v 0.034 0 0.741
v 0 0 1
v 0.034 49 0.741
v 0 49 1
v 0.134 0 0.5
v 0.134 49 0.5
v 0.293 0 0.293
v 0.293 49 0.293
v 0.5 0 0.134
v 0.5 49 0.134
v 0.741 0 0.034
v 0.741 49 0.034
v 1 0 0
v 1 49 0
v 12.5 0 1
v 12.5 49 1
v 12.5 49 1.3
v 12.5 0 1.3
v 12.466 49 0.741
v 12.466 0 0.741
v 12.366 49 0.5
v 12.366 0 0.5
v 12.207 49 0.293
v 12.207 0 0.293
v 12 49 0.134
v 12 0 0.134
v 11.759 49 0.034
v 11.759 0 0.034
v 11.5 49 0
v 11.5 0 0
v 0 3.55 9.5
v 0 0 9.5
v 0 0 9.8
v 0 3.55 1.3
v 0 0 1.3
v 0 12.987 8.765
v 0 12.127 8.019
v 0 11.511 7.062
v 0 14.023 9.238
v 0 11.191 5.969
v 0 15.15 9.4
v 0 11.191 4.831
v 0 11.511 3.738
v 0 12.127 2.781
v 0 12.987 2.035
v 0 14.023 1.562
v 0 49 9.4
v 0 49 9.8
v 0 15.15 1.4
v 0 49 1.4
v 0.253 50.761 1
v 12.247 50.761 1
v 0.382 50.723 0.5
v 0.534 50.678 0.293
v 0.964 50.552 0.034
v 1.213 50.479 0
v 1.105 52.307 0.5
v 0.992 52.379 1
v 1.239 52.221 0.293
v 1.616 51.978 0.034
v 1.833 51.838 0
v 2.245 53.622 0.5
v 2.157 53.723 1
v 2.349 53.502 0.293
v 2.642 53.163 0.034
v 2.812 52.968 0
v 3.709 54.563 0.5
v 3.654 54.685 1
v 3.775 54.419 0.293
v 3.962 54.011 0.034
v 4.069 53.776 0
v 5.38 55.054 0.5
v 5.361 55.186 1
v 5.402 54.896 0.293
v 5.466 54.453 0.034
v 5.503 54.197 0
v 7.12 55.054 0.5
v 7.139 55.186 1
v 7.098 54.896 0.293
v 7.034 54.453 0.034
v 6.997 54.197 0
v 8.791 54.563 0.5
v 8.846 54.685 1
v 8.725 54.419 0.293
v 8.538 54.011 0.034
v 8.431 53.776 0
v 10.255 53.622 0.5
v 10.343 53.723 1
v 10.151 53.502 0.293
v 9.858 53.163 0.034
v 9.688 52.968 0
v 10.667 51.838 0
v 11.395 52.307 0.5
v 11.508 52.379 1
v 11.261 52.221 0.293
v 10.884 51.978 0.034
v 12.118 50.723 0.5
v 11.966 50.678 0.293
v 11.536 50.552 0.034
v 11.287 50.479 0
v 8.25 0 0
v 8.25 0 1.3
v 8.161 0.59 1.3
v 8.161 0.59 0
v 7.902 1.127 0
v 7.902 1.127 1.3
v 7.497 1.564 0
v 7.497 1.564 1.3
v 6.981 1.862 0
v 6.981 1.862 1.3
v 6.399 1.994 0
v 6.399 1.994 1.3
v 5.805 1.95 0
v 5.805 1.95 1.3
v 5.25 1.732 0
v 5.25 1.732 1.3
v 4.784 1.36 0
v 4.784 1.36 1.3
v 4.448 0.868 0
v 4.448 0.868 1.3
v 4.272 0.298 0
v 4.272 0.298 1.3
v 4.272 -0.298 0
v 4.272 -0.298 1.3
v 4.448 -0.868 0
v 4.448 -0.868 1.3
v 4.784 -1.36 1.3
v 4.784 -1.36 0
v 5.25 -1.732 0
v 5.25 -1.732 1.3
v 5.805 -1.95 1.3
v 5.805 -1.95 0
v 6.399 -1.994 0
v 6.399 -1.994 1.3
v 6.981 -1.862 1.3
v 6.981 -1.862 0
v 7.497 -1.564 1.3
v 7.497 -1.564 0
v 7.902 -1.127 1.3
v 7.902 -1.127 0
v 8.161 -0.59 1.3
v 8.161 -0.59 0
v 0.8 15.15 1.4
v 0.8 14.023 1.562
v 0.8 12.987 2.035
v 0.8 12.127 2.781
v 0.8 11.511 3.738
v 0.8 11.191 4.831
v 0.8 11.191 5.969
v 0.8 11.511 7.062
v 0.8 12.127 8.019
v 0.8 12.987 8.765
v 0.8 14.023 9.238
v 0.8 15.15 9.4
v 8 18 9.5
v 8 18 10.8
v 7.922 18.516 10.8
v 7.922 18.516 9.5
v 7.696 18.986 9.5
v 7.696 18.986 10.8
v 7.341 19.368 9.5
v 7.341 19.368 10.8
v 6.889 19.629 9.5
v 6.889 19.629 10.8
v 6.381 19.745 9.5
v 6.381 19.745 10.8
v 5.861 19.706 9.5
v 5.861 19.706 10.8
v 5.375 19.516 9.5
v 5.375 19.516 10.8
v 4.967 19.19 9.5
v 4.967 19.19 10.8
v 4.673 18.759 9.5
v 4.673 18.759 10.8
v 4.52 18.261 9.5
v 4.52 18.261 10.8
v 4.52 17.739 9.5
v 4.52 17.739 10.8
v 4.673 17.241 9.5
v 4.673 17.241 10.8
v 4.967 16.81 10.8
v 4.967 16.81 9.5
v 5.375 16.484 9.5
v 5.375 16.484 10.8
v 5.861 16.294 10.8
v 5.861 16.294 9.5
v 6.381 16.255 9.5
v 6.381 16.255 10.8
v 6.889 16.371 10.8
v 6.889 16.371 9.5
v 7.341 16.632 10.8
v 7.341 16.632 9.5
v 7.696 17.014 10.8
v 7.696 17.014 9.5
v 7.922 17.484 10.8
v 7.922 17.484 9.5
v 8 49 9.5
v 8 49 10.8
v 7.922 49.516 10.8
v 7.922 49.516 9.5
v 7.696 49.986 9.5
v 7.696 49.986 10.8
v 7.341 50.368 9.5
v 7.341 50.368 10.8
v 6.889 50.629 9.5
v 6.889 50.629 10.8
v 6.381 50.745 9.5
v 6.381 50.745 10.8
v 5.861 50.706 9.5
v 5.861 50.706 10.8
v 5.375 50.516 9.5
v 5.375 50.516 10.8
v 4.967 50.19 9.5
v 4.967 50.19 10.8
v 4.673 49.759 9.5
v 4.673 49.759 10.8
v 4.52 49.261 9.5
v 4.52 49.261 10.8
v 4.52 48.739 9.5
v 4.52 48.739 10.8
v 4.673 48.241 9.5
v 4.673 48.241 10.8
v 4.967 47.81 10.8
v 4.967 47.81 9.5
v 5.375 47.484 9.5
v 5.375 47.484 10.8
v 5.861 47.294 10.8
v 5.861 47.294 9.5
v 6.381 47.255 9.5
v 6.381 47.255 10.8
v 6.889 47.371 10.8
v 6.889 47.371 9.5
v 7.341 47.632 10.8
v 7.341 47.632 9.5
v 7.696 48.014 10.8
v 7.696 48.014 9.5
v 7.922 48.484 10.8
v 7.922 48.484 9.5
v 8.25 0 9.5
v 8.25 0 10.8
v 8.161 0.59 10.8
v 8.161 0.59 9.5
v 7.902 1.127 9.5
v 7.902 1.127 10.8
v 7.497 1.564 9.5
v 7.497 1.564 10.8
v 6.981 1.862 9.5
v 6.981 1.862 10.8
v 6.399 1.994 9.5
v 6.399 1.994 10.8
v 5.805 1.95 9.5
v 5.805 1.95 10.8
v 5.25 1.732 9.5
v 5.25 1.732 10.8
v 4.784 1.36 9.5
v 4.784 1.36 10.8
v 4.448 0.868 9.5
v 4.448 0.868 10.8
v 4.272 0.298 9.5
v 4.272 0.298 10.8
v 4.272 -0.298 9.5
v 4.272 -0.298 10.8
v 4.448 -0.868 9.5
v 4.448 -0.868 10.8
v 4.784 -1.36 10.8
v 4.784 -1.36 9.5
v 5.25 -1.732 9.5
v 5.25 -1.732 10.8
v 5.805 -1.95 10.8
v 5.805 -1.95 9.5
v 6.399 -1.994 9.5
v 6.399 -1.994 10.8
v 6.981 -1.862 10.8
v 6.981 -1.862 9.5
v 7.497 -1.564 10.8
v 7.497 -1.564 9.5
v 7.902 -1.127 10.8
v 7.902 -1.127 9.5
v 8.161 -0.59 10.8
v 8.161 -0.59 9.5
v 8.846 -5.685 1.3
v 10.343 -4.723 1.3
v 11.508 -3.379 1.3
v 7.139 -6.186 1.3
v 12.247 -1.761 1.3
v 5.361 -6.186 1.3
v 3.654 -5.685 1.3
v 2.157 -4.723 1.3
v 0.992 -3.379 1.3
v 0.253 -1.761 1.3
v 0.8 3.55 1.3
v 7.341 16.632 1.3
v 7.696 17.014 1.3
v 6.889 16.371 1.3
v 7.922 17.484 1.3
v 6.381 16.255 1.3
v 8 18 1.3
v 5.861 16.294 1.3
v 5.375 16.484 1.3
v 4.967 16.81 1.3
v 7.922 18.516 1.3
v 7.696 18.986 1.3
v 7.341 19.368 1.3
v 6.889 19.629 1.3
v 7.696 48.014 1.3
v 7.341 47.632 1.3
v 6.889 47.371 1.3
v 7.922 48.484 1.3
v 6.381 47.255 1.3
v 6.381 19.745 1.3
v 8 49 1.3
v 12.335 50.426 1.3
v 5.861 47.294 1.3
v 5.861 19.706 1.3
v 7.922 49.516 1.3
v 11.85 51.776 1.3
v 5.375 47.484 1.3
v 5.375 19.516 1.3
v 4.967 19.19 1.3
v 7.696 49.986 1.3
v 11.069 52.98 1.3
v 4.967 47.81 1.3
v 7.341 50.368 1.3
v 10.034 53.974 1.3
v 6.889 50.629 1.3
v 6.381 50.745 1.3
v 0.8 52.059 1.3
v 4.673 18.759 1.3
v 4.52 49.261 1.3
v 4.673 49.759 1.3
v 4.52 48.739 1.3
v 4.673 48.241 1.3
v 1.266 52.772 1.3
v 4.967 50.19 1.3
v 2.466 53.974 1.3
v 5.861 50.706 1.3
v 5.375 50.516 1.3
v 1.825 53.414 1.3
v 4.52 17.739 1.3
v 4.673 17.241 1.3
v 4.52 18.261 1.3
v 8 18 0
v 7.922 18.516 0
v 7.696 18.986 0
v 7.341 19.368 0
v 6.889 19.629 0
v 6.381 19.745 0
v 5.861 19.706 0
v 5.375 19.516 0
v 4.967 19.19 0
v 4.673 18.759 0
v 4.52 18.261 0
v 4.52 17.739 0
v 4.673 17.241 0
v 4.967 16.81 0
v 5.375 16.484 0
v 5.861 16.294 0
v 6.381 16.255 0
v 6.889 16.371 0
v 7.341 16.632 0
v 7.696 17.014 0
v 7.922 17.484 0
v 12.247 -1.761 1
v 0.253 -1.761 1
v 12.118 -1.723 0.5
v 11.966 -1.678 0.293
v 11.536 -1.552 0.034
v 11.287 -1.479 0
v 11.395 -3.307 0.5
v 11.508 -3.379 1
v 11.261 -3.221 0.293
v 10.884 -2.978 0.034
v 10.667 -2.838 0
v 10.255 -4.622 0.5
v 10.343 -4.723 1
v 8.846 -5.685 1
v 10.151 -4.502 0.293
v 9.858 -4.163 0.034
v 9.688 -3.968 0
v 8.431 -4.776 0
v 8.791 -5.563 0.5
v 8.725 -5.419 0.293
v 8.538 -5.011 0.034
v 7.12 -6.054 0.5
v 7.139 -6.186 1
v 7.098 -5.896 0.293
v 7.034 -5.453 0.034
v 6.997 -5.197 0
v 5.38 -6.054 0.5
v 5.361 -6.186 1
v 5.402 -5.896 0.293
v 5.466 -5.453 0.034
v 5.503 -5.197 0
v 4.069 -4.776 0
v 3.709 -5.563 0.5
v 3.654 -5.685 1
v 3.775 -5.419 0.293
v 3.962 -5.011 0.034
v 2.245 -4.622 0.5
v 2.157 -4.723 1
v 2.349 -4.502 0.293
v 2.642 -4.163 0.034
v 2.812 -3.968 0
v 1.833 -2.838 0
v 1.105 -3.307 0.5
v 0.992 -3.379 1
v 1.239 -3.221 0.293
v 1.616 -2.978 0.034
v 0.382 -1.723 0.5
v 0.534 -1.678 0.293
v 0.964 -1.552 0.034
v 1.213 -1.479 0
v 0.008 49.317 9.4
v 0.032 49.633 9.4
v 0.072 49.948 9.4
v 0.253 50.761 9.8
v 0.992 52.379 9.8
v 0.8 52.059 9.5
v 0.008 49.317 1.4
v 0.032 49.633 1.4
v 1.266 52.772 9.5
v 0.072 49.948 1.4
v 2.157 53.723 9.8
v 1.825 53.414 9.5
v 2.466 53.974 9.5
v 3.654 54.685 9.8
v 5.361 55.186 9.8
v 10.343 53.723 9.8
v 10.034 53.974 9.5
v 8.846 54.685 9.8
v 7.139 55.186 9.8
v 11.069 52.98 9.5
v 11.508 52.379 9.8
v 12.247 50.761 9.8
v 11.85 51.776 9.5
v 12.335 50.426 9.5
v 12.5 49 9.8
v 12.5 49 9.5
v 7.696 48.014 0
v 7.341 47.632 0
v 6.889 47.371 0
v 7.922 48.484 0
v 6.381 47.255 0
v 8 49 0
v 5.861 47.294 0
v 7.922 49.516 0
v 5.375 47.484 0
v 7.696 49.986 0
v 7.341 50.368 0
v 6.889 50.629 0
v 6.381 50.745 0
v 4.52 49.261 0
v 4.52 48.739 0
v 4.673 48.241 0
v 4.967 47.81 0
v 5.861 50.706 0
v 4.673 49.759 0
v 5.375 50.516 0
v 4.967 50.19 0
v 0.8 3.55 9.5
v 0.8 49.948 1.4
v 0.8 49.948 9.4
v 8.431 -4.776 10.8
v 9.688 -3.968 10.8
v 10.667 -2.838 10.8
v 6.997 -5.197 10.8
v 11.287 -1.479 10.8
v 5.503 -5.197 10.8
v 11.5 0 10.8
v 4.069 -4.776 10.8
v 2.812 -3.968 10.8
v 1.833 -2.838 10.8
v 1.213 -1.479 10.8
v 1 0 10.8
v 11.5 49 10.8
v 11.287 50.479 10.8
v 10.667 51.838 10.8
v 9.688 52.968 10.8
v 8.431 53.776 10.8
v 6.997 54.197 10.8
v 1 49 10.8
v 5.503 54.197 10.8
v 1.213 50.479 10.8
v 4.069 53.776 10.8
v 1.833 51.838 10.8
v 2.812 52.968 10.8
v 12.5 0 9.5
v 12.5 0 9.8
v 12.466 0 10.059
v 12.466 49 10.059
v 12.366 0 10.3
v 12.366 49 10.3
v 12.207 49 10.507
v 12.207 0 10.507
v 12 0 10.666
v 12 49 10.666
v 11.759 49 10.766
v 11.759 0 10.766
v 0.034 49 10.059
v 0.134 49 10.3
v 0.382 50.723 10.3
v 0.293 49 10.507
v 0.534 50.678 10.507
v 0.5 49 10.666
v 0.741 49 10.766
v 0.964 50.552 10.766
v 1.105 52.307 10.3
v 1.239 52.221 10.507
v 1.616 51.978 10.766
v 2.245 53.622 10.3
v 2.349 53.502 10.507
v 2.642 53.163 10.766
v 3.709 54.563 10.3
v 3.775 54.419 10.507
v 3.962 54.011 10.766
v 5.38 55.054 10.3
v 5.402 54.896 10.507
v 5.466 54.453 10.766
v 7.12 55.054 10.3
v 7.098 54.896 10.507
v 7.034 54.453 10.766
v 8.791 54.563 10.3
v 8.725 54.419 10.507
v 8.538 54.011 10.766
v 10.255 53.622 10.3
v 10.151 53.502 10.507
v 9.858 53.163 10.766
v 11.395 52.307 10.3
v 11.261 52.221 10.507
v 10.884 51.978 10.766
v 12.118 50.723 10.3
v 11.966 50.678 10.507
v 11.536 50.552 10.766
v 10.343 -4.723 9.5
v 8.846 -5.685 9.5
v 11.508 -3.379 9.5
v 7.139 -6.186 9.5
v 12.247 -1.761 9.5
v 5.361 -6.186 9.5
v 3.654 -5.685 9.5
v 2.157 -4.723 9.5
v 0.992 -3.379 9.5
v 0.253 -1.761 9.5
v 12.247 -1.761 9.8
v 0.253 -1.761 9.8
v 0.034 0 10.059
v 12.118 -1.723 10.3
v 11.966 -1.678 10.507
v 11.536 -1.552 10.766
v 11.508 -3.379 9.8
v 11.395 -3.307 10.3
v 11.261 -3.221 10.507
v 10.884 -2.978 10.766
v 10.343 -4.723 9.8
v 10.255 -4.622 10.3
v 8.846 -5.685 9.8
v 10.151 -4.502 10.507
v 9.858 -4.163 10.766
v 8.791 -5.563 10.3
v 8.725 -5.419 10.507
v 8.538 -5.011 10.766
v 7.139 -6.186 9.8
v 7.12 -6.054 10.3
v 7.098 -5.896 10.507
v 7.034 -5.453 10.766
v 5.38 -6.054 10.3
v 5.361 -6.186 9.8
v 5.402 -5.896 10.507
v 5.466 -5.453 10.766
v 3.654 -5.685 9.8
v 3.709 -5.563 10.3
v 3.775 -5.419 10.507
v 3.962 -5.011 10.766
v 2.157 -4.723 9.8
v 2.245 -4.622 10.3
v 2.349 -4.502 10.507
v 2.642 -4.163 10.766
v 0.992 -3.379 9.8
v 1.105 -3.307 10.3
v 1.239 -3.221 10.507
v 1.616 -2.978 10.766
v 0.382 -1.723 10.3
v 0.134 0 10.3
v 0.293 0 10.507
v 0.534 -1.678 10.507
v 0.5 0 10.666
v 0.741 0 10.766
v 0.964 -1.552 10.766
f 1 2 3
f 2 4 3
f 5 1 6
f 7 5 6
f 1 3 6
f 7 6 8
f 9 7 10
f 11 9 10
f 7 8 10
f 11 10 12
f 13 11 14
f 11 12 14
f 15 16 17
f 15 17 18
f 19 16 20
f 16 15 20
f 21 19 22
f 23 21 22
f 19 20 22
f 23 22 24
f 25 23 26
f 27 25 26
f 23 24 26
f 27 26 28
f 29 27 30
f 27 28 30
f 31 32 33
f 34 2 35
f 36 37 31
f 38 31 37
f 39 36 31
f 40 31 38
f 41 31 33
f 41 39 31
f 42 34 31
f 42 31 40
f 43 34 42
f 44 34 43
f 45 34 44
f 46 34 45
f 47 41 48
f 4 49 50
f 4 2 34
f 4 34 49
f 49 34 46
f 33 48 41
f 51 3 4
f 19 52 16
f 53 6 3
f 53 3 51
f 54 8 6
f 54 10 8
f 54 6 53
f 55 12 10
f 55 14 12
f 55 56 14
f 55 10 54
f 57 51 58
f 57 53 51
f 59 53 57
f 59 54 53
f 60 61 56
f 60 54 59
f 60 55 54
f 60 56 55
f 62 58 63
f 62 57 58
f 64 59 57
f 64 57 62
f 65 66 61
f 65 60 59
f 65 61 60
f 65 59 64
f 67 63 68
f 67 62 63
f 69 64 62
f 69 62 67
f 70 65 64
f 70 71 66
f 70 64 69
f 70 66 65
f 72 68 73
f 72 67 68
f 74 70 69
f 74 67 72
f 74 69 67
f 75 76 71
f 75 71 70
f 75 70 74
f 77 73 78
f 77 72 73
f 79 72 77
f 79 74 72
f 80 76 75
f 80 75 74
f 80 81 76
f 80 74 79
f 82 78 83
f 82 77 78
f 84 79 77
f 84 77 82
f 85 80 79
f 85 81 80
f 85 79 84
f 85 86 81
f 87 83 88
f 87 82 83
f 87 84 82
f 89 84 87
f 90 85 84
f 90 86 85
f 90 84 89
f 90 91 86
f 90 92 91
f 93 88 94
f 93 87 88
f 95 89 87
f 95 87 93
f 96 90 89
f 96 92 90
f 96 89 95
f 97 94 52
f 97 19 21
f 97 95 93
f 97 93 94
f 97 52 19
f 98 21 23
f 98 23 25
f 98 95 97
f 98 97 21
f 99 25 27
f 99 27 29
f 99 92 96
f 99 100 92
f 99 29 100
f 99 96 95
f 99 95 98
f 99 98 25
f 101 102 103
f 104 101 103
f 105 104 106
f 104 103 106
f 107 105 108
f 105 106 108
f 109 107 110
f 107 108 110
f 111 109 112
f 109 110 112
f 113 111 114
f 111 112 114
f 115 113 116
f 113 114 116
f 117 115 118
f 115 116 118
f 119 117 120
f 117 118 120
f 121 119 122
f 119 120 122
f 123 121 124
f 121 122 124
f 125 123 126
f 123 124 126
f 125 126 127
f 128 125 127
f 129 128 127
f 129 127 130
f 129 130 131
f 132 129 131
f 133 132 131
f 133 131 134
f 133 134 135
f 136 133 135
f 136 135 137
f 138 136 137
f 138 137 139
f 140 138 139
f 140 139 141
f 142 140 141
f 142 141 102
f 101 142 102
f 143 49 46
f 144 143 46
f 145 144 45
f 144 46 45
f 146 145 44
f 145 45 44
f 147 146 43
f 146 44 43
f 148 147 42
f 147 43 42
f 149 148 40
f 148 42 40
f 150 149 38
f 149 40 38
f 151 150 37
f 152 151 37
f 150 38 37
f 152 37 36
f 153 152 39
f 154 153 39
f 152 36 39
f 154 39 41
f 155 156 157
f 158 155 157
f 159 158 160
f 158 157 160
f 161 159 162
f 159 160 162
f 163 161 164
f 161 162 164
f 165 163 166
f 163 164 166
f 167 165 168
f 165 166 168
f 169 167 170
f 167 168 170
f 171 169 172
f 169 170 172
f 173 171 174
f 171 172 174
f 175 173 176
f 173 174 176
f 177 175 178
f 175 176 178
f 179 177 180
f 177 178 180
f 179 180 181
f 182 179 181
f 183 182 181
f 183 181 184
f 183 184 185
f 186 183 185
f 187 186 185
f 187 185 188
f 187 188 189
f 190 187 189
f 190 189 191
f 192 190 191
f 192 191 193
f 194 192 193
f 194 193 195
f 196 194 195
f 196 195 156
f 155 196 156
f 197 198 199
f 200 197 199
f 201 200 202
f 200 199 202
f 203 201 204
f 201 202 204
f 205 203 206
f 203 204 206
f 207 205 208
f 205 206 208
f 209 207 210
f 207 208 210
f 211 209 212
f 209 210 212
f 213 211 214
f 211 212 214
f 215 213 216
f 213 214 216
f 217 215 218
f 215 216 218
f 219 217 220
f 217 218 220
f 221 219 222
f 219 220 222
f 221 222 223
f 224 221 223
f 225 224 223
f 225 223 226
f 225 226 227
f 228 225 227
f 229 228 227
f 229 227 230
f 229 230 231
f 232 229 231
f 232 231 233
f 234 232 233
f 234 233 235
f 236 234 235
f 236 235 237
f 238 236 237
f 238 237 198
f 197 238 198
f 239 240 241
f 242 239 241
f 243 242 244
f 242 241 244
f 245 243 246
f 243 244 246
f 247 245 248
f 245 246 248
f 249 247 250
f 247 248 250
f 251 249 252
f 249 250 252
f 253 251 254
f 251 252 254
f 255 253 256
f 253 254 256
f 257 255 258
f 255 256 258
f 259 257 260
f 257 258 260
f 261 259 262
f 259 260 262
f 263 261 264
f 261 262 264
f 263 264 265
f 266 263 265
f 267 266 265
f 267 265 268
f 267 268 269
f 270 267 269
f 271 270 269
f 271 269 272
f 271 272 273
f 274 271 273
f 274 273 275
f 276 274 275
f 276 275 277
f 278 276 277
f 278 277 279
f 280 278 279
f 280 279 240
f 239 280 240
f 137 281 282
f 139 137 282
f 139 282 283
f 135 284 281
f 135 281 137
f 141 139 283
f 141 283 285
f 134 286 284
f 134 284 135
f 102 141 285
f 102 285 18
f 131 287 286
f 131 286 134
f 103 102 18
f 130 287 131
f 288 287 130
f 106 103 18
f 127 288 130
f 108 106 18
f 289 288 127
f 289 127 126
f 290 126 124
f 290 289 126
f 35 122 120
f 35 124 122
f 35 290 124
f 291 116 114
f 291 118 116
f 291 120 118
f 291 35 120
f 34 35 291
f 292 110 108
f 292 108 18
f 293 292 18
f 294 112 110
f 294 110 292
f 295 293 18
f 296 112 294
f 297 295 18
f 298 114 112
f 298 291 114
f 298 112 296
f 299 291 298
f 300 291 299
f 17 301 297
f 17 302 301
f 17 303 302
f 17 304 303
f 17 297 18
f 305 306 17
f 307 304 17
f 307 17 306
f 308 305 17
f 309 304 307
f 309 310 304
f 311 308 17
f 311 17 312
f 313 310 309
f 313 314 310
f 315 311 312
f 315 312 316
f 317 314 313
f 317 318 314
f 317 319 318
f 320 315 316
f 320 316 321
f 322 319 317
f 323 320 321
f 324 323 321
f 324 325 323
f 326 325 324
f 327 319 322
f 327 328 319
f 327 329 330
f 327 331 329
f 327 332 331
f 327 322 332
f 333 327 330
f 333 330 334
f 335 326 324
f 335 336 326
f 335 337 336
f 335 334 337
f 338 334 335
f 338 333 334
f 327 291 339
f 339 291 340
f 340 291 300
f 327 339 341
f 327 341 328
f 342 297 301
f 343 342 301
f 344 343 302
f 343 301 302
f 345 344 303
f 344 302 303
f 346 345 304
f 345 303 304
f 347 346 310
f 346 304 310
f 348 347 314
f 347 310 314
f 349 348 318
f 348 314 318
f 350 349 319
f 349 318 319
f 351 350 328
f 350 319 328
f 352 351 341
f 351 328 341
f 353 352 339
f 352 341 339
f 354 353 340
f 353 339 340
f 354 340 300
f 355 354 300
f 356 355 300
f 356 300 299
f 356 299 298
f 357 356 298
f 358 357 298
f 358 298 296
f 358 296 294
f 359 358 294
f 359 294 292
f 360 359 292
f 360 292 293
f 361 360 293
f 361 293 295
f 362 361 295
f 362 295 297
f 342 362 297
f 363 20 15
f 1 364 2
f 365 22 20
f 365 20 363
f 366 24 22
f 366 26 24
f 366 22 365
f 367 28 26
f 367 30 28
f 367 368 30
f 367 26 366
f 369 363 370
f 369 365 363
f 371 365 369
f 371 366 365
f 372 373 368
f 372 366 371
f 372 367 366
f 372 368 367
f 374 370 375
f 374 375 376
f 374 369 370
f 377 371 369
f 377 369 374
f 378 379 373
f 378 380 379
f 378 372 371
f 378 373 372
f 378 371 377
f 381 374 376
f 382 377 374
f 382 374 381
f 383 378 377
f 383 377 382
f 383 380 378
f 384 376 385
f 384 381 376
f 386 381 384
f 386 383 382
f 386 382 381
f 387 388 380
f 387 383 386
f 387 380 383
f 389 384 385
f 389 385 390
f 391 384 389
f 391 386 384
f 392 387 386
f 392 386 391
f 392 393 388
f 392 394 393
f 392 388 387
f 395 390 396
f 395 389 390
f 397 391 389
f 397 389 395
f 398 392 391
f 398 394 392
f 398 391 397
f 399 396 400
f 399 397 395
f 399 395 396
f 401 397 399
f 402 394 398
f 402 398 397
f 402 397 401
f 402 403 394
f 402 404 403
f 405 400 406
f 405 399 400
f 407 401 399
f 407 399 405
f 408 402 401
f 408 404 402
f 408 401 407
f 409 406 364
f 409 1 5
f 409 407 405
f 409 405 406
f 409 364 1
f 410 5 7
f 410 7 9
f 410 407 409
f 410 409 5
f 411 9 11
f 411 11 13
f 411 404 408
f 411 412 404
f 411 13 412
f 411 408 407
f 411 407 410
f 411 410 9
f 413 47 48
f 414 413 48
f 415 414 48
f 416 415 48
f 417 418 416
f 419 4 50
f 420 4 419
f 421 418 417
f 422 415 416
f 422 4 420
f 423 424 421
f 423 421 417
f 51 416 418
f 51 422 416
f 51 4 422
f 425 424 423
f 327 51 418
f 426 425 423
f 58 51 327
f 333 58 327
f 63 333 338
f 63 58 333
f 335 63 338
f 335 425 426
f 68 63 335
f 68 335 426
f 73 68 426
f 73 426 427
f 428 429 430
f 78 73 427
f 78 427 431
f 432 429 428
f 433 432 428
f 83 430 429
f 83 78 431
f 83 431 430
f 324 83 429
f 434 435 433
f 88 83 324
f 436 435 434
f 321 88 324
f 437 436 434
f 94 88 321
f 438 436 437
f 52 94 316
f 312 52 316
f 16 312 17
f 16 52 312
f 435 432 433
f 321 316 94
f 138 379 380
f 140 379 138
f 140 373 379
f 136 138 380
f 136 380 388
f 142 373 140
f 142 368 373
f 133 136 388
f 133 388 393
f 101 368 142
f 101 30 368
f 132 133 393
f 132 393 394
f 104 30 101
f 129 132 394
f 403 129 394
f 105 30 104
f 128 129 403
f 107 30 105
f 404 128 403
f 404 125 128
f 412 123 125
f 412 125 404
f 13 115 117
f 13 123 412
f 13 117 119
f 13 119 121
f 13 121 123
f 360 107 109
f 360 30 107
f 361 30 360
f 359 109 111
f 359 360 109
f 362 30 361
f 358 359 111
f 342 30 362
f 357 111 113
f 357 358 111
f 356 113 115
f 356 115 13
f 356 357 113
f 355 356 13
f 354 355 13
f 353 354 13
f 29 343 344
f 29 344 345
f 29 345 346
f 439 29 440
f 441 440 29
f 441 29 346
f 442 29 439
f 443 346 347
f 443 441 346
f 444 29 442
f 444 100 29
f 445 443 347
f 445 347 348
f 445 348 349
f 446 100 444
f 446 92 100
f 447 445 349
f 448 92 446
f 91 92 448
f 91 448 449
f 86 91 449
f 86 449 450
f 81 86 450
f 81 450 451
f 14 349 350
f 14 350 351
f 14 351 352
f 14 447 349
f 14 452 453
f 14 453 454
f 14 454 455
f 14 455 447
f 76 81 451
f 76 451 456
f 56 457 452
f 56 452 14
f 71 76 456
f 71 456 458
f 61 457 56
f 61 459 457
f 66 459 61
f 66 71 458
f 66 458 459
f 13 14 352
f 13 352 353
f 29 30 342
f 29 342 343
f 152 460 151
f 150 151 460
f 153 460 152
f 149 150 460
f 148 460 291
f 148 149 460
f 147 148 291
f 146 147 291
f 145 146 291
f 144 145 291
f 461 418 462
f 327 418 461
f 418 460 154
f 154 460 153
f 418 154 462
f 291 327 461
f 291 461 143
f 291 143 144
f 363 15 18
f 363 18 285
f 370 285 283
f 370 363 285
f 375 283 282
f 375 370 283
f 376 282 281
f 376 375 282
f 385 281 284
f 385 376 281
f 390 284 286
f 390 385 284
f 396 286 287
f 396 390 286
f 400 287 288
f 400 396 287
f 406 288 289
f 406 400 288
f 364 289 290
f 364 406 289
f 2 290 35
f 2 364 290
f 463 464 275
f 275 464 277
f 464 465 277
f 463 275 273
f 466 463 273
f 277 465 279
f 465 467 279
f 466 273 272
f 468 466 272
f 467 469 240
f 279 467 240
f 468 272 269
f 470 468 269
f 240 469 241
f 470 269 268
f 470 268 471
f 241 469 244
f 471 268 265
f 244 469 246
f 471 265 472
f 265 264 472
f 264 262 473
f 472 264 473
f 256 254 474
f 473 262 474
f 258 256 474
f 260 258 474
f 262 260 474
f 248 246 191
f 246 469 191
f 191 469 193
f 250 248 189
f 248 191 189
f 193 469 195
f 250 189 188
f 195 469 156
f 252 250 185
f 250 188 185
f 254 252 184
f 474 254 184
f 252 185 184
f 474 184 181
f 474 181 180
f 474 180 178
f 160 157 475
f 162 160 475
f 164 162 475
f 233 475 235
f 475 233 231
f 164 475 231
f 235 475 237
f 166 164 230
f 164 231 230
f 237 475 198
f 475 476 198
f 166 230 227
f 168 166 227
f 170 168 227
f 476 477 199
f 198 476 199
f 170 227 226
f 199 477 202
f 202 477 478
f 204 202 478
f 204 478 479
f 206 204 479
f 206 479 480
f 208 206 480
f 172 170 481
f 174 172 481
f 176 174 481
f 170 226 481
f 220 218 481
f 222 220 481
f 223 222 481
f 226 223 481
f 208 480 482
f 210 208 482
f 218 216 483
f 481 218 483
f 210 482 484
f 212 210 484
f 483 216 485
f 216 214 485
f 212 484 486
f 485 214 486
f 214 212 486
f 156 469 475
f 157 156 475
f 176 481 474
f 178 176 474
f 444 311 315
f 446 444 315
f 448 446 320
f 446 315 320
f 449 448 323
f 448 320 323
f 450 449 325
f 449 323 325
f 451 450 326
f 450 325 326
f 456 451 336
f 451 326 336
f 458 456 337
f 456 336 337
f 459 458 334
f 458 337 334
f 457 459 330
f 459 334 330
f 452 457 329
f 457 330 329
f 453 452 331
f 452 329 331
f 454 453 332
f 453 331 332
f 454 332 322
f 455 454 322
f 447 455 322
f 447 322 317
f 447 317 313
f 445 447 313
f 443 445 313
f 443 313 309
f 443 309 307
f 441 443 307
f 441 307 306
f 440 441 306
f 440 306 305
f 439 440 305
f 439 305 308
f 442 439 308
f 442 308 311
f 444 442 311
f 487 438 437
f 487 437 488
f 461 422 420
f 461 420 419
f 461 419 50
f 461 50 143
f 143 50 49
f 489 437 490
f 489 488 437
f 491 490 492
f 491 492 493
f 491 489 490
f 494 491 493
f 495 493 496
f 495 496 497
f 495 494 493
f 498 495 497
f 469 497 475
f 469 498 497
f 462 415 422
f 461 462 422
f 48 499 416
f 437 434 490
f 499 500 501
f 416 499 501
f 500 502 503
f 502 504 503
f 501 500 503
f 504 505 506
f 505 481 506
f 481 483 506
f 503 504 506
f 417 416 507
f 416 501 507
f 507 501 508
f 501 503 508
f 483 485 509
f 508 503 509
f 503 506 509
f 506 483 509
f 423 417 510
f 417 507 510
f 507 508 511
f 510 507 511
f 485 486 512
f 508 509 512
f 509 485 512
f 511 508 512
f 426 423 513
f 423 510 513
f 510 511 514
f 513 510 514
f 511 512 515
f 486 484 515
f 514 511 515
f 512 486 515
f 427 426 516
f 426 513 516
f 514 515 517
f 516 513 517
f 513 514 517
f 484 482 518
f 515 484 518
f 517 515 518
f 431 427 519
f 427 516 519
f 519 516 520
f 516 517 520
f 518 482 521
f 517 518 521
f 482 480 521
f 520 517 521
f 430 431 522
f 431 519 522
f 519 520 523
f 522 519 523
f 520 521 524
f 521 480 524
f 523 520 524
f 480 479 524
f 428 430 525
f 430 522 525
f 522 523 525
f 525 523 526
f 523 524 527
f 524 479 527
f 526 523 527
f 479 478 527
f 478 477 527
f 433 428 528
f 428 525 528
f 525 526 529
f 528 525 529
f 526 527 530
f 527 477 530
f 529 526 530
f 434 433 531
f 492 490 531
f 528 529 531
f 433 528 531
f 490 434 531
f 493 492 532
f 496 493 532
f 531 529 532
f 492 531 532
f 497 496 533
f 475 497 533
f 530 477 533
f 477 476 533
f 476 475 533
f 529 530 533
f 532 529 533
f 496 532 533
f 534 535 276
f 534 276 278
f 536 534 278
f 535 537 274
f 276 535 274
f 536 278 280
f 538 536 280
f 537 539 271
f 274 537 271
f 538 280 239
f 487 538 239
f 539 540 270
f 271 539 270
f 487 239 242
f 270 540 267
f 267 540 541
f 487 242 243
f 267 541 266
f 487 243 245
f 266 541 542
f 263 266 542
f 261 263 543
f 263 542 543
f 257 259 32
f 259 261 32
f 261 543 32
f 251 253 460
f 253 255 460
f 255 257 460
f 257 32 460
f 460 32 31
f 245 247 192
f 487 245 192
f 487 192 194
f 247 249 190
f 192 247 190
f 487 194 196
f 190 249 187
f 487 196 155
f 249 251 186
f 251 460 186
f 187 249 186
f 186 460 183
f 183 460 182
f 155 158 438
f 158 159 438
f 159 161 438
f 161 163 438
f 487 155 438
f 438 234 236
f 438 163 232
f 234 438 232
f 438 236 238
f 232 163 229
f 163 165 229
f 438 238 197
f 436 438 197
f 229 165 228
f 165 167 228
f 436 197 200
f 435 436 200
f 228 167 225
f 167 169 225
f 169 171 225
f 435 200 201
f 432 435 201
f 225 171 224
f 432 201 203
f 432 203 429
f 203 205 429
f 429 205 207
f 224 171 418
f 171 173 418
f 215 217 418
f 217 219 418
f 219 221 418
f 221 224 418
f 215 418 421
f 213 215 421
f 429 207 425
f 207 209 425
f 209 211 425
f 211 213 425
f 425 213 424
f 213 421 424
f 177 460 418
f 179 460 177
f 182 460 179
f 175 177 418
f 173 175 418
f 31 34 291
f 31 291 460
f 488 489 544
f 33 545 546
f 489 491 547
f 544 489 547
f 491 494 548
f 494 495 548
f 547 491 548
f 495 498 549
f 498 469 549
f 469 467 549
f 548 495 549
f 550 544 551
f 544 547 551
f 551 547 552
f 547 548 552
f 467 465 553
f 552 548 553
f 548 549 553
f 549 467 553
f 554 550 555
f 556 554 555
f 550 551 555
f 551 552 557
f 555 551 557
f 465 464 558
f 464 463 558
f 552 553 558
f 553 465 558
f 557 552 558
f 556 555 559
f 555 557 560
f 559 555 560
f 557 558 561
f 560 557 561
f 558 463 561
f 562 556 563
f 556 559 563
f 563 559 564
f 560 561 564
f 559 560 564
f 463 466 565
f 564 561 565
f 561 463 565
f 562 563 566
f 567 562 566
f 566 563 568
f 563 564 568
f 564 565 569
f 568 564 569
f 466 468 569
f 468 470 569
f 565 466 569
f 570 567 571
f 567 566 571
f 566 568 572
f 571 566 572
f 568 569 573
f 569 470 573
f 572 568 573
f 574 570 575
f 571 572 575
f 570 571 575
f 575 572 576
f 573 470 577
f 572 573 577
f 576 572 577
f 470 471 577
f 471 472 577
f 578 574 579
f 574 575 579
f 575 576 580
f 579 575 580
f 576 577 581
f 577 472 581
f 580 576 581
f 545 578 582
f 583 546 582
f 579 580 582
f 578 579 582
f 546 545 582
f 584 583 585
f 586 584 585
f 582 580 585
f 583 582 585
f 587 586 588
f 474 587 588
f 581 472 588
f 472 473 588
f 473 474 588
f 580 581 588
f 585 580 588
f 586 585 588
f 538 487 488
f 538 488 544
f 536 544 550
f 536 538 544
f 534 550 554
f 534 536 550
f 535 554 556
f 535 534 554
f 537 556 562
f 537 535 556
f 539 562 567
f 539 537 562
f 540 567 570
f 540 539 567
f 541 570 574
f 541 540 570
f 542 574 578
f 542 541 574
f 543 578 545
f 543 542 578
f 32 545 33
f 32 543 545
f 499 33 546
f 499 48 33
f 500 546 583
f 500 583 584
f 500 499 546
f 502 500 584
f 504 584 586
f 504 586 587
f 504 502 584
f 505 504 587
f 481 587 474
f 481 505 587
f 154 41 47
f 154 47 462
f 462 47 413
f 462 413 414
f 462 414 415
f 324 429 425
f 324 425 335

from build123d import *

# Parameters (mm, degrees)
BASE_EXTRUSION_DEPTH    = 10.8
CONG_1_R                = 1
CONG_2_R                = 1
ESQUISSE2_W             = 8.2
ESQUISSE2_H             = 65.100918748
ENL_V_MAT_EXTRU_1_DEPTH = 11.7
ESQUISSE3_W             = 8.2
ESQUISSE3_H             = 9.8
ENL_V_MAT_EXTRU_3_DEPTH = 11.7
ESQUISSE4_R             = 2
ESQUISSE4_R_2           = 1.75
ENL_V_MAT_EXTRU_4_DEPTH = 58.666736534


with BuildPart() as part:
    # Esquisse1 → Base-Extrusion (new body)
    with BuildSketch(Plane.XY):
        with BuildLine():
            Line((0, 0), (0, 49))
            ThreePointArc((0, 49), (6.25, 55.25), (12.5, 49))
            Line((12.5, 49), (12.5, 0))
            ThreePointArc((12.5, 0), (6.25, -6.25), (0, 0))
        make_face()
    extrude(amount=BASE_EXTRUSION_DEPTH)

    # Congé1
    cong_1_edges = [part.edges().sort_by_distance(p)[0] for p in [
        (6.25, 55.25, 10.8),
        (0, 24.5, 10.8),
        (6.25, -6.25, 10.8),
        (12.5, 24.5, 10.8),
    ]]
    fillet(cong_1_edges, radius=CONG_1_R)

    # Congé2
    cong_2_edges = [part.edges().sort_by_distance(p)[0] for p in [
        (0, 24.5, 0),
        (6.25, 55.25, 0),
        (12.5, 24.5, 0),
        (6.25, -6.25, 0),
    ]]
    fillet(cong_2_edges, radius=CONG_2_R)

    # Esquisse2 → Enlèv. mat.-Extru.1 (cut)
    with BuildSketch(Plane(origin=(12.5, 0, 0), x_dir=(0, 0, -1), z_dir=(1, 0, 0))):
        with Locations((-5.4, 21.424016652)):
            Rectangle(ESQUISSE2_W, ESQUISSE2_H)
    extrude(amount=-ENL_V_MAT_EXTRU_1_DEPTH, mode=Mode.SUBTRACT)

    # Esquisse3 → Enlèv. mat.-Extru.3 (cut)
    with BuildSketch(Plane.ZY):
        with BuildLine():
            Line((1.4, 49.948011349), (1.4, 15.15))
            ThreePointArc((1.4, 15.15), (5.4, 11.15), (9.4, 15.15))
            Line((9.4, 15.15), (9.4, 49.948011349))
            Line((9.4, 49.948011349), (1.4, 49.948011349))
        make_face()
        with Locations((5.4, -1.35)):
            Rectangle(ESQUISSE3_W, ESQUISSE3_H)
    extrude(amount=-ENL_V_MAT_EXTRU_3_DEPTH, mode=Mode.SUBTRACT)

    # Esquisse4 → Enlèv. mat.-Extru.4 (cut, through all)
    with BuildSketch(Plane.XY.offset(10.8)):
        with Locations((6.25, 0)):
            Circle(ESQUISSE4_R)
        with Locations((6.25, 49)):
            Circle(ESQUISSE4_R_2)
        with Locations((6.25, 18)):
            Circle(ESQUISSE4_R_2)
    extrude(amount=-ENL_V_MAT_EXTRU_4_DEPTH, mode=Mode.SUBTRACT)


solid = part.part
